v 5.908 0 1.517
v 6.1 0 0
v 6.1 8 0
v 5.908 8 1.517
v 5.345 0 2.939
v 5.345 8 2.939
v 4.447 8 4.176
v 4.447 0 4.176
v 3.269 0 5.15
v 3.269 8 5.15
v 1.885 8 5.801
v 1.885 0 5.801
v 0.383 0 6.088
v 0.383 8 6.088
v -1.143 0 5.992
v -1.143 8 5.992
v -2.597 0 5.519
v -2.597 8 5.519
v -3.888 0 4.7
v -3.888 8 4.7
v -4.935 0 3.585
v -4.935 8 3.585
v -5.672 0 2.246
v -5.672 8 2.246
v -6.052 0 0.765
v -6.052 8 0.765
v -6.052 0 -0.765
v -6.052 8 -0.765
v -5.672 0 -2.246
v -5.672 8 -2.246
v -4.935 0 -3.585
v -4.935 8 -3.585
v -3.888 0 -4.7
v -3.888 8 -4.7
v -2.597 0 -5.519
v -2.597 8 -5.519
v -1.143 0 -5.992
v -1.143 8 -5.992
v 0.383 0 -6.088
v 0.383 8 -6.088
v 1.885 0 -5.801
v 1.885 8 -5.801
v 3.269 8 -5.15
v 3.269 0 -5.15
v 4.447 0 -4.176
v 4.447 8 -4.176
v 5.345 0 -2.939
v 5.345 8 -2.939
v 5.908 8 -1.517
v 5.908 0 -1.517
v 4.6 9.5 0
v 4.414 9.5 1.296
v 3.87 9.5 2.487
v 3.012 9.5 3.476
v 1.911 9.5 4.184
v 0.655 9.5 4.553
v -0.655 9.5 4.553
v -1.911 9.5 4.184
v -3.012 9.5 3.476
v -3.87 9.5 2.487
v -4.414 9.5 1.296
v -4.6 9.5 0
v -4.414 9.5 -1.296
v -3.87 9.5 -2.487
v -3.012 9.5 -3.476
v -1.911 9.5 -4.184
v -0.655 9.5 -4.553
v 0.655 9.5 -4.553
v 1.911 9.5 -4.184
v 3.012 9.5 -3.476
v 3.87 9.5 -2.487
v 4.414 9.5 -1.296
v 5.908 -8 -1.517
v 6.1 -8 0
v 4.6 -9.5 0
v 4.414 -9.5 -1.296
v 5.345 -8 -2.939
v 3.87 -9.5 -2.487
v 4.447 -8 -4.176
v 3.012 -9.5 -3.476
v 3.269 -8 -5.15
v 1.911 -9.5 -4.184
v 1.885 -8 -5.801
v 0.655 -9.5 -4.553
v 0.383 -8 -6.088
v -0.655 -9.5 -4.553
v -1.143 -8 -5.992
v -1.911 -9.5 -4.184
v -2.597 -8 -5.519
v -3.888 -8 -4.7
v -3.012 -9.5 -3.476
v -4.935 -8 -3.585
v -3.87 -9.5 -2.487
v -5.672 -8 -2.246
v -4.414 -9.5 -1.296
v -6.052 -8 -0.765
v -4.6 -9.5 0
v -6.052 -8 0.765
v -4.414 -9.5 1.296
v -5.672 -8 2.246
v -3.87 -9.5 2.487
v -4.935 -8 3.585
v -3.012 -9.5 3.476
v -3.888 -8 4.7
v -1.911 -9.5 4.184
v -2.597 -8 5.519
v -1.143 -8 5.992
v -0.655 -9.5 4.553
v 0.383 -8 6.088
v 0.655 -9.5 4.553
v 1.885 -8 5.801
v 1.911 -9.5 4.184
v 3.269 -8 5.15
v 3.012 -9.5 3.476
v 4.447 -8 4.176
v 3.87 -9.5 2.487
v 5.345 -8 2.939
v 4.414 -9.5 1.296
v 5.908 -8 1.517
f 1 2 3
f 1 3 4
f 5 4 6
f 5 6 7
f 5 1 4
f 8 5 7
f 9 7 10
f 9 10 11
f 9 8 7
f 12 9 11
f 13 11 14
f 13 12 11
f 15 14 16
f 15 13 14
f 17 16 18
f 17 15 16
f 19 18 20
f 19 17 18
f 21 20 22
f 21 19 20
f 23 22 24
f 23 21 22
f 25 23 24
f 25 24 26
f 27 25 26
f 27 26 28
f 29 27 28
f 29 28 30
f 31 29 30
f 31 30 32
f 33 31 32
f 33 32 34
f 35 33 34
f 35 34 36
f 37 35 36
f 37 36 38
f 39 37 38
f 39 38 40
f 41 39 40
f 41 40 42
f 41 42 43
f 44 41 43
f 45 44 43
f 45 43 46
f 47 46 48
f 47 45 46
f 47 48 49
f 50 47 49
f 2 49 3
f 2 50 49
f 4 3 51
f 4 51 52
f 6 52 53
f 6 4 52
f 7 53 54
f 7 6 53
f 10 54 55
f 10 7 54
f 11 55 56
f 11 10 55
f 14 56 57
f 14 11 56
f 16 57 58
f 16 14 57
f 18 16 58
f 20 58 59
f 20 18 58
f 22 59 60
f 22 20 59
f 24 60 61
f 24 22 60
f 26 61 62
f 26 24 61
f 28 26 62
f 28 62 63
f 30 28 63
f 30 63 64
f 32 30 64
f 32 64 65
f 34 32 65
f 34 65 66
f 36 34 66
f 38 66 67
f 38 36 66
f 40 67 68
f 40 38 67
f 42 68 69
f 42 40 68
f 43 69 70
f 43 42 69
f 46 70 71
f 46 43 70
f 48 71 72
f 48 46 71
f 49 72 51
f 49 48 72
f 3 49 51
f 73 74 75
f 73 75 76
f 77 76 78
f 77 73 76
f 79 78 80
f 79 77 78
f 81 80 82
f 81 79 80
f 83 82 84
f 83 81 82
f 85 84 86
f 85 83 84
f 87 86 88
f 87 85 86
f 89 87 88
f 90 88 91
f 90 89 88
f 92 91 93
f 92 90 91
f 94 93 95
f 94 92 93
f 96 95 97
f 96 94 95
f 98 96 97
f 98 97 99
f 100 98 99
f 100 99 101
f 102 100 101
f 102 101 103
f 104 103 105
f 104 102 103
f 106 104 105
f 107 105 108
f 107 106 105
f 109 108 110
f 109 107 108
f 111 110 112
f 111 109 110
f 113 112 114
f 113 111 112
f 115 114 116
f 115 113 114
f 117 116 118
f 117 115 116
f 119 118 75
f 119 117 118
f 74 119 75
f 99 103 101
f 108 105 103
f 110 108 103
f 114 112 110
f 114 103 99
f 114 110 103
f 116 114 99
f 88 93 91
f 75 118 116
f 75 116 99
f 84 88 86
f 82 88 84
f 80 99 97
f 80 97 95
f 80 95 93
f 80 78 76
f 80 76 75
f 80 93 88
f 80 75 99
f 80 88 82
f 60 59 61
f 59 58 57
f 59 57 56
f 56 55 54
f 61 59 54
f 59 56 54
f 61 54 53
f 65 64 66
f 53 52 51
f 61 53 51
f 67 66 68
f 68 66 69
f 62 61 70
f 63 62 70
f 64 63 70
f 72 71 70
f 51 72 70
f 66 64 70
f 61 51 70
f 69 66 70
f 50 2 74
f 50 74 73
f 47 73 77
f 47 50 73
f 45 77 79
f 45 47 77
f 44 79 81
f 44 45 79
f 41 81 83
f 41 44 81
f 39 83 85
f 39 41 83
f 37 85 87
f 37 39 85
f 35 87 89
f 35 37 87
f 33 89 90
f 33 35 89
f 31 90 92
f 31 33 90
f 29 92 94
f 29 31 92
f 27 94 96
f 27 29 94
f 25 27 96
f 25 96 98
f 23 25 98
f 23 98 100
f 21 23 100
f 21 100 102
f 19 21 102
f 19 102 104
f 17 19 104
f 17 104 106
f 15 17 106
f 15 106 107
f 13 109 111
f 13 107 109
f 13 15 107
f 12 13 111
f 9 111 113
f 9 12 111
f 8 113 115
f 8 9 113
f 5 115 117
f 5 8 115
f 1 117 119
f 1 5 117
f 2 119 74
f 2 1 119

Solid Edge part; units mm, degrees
sketch "Sketch1" plane through (0, 0, 0) normal (0, -1, 0) x (1, 0, 0)
  circle A0 centre (0, 0) radius 6.1
extrude "Protrusion1" add sketch "Sketch1" along normal mid plane 19
chamfer "Chanfro_1" distance 1.5 angle 45 1 edges at (-6.1, 9.5, 0) measured on face at (-3.9447, 9.5, 4.1887)
chamfer "Chanfro_2" distance 1.5 angle 45 1 edges at (-6.1, -9.5, 0) measured on face at (-3.9447, -9.5, 4.1887)
